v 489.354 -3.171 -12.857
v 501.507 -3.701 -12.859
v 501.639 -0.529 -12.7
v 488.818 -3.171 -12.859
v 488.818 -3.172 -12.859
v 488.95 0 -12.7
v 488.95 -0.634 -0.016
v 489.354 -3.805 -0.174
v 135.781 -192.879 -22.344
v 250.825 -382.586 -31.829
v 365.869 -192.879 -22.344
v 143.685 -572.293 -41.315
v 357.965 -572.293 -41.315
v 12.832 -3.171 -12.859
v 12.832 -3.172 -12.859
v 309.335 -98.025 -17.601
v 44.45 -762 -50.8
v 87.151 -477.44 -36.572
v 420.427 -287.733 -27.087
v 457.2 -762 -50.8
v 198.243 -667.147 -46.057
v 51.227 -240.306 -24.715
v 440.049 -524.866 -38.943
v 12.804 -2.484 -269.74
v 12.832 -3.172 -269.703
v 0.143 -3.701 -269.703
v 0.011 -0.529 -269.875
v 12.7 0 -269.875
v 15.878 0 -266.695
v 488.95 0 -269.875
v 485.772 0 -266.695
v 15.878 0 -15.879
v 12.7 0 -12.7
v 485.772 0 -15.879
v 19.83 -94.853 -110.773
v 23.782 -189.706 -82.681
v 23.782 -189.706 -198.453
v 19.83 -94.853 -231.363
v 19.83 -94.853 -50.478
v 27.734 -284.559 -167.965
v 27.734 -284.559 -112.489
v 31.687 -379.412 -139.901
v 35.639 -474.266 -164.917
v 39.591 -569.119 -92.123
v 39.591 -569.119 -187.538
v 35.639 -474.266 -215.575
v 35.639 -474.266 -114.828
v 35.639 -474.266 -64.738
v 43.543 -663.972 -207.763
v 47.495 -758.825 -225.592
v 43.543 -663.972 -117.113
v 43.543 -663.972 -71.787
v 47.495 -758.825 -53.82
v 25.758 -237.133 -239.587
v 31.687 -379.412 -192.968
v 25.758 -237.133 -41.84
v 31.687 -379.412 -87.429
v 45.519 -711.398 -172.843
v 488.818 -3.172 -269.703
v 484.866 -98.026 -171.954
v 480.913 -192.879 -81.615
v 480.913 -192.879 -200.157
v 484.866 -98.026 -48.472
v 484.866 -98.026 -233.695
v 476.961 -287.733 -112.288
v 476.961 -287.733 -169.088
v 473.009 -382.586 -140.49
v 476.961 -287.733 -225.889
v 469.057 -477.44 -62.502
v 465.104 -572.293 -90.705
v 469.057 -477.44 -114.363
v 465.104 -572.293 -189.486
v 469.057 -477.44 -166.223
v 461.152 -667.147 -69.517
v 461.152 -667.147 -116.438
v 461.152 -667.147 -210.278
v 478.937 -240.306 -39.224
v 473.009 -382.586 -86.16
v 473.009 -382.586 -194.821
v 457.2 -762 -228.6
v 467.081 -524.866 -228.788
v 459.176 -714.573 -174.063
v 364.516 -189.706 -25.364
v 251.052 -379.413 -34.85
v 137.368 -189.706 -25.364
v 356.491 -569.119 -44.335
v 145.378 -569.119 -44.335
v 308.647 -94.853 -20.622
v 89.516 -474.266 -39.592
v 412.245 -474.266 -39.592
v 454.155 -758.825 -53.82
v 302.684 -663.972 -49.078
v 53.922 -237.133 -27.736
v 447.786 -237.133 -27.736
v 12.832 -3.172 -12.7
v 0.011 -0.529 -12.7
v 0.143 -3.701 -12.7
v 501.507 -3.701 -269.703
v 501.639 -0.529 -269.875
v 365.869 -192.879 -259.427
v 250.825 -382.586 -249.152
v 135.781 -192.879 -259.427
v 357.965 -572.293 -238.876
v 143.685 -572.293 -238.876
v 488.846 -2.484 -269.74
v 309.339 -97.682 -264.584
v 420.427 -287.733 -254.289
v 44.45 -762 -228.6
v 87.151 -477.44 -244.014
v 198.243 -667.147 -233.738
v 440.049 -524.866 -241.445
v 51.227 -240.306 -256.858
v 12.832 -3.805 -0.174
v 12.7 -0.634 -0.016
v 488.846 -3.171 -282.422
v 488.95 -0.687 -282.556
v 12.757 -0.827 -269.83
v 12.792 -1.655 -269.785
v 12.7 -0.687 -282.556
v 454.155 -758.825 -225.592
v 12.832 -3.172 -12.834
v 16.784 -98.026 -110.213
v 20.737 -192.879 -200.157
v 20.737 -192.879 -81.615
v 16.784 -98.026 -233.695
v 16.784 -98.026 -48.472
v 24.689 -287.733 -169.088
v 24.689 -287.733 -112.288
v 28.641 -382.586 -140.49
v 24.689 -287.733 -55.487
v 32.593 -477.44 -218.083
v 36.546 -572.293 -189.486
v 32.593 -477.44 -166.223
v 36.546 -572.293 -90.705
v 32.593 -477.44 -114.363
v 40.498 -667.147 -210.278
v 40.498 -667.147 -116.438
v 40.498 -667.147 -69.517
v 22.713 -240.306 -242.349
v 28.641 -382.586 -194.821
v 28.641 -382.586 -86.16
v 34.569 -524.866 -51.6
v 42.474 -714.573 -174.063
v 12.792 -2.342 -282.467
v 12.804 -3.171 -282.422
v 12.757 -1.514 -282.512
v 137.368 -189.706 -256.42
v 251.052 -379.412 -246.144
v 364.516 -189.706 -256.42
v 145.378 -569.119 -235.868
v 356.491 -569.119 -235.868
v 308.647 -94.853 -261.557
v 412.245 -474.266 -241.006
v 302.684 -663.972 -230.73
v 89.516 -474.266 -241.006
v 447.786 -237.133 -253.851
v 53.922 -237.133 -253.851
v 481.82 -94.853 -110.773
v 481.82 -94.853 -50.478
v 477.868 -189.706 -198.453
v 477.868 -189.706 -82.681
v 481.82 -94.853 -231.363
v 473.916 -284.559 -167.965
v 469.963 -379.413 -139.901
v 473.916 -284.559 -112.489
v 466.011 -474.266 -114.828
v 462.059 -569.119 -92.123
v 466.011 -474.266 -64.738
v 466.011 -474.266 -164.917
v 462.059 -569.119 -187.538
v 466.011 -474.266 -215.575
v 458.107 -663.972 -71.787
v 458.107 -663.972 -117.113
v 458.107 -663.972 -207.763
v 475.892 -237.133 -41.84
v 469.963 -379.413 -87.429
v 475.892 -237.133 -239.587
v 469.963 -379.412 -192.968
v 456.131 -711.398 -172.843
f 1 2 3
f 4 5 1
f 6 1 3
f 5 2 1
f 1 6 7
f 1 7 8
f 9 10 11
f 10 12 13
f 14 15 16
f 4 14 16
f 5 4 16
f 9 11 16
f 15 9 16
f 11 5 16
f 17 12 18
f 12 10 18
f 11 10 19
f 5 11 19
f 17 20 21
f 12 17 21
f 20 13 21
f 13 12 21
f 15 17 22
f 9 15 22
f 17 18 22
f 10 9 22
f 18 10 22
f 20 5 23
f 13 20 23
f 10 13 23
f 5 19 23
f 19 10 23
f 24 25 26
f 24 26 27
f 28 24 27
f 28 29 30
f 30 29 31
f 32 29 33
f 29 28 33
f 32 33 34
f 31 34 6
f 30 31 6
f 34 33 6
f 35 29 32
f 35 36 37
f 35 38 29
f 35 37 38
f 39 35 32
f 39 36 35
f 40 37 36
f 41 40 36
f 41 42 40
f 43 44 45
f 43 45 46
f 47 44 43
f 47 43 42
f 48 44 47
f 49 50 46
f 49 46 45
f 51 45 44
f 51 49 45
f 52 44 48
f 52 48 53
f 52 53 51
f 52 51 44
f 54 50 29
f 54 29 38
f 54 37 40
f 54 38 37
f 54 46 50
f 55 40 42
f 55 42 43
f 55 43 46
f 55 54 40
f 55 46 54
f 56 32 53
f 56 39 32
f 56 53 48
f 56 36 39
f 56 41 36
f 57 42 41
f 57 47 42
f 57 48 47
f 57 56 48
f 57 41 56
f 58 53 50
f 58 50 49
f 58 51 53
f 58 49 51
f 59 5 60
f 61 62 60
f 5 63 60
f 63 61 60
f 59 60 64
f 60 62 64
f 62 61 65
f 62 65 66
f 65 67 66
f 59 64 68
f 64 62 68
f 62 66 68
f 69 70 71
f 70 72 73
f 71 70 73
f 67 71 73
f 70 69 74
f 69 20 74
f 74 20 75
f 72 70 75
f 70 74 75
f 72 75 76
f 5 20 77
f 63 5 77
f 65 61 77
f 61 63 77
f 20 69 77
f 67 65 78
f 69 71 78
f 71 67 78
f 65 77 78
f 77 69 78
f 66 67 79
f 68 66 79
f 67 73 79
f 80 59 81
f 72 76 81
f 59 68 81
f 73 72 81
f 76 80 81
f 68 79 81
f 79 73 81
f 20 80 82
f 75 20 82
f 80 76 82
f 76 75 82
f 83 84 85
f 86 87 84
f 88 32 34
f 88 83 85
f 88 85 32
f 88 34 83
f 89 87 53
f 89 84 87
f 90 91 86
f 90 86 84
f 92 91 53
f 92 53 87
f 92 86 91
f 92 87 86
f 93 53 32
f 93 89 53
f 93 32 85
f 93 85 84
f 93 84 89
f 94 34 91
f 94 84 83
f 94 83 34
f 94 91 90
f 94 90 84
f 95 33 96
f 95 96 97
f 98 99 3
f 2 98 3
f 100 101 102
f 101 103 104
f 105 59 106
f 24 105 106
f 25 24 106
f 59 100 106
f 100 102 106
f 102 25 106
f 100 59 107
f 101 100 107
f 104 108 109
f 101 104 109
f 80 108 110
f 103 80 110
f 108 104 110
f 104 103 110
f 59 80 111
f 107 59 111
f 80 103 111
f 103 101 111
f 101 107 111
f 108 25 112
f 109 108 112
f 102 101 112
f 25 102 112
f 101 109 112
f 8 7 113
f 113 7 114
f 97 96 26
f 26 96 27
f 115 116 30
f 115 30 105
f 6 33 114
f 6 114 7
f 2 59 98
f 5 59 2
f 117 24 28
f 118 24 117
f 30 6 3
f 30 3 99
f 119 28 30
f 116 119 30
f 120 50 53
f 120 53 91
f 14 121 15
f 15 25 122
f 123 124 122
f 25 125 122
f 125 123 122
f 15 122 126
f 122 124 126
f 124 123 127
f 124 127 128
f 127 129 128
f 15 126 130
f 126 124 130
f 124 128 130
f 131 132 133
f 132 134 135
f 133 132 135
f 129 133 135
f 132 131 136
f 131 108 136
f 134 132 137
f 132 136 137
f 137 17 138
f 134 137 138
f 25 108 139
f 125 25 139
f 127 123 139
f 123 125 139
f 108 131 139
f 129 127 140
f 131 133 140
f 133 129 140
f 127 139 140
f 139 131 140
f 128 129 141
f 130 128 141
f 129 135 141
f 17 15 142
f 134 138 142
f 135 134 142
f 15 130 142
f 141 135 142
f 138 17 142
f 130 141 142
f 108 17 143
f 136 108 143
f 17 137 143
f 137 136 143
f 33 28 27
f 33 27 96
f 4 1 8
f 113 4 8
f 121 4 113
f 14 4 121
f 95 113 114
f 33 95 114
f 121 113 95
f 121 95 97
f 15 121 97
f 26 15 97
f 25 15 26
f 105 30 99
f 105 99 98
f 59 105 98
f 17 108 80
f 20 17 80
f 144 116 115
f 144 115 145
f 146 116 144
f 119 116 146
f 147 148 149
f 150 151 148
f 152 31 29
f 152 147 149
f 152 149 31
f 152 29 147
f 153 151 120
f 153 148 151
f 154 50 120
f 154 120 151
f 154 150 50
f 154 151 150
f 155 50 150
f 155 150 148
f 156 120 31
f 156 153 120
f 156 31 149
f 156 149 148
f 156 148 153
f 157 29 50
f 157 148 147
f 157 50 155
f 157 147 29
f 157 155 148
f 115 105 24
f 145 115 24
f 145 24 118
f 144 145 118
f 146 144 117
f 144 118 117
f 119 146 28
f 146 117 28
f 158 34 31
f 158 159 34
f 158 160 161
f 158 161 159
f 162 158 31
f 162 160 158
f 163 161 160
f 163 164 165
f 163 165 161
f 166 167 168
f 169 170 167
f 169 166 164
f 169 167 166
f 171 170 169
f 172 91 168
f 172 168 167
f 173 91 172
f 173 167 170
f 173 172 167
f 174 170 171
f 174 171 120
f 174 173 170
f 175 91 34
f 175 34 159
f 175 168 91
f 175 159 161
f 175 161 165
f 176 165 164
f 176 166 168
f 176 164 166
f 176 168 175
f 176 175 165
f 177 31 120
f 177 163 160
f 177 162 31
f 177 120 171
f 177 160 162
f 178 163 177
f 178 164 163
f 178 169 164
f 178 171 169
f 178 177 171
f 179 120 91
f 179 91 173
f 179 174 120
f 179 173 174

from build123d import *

# Parameters (mm, degrees)
SHELL2_T            = -3.175
BOSS_EXTRUDE3_DEPTH = 12.7
BOSS_EXTRUDE4_DEPTH = 12.7
BOSS_EXTRUDE5_DEPTH = 12.7
BOSS_EXTRUDE6_DEPTH = 12.7


with BuildPart() as part:
    # Sketch1 → Loft1 section 0
    with BuildSketch(Plane(origin=(0, 0, 0), x_dir=(1, 0, 0), z_dir=(0, 1, 0))):
        with BuildLine():
            Line((12.7, 269.875), (12.7, 12.7))
            Line((12.7, 12.7), (488.95, 12.7))
            Line((488.95, 12.7), (488.95, 269.875))
            Line((488.95, 269.875), (12.7, 269.875))
        make_face()
    # Sketch6 → Loft1 section 1
    with BuildSketch(Plane(origin=(0, -762, 0), x_dir=(1, 0, 0), z_dir=(0, 1, 0))):
        with BuildLine():
            Line((44.45, 50.8), (457.2, 50.8))
            Line((457.2, 50.8), (457.2, 228.6))
            Line((457.2, 228.6), (44.45, 228.6))
            Line((44.45, 228.6), (44.45, 50.8))
        make_face()
    loft()

    # Shell2
    shell2_openings = [part.faces().sort_by_distance(p)[0] for p in [
        (250.825, 0, -141.2875),
    ]]
    offset(amount=SHELL2_T, openings=shell2_openings, kind=Kind.INTERSECTION)

    # Sketch7 → Boss-Extrude3 (add)
    with BuildSketch(Plane(origin=(12.677989601, 0.528249567, 0), x_dir=(0, 0, 1), z_dir=(-0.9991330730923519, -0.04163054471218133, 0))):
        Polygon((-269.875, -0.528707918), (-12.7, -0.528707918), (-12.7, -3.703707918), (-269.703169927, -3.703707918), align=None)
    extrude(amount=BOSS_EXTRUDE3_DEPTH)

    # Sketch8 → Boss-Extrude4 (add)
    with BuildSketch(Plane(origin=(0, -14.575464349, -269.085495681), x_dir=(-1, 0, 0), z_dir=(0, -0.05408737784845071, -0.998536206432936))):
        with BuildLine():
            Line((-12.7, 14.596831097), (-488.95, 14.596831097))
            Line((-488.95, 14.596831097), (-488.846481323, 12.108740796))
            Line((-488.846481323, 12.108740796), (-12.803518677, 12.108740796))
            ThreePointArc((-12.803518677, 12.108740796), (-12.777627818, 13.353862222), (-12.7, 14.596831097))
        make_face()
    extrude(amount=BOSS_EXTRUDE4_DEPTH)

    # Sketch9 → Boss-Extrude5 (add)
    with BuildSketch(Plane(origin=(488.102599653, -20.337608319, 0), x_dir=(0, 0, -1), z_dir=(0.9991330730923519, -0.041630544712181326, 0))):
        Polygon((12.7, 20.355254837), (269.875, 20.355254837), (269.703169927, 17.180254837), (12.858612375, 17.180254837), align=None)
    extrude(amount=BOSS_EXTRUDE5_DEPTH)

    # Sketch10 → Boss-Extrude6 (add)
    with BuildSketch(Plane(origin=(0, 0.633416459, -12.668329177), x_dir=(1, 0, 0), z_dir=(0, -0.049937616943892316, 0.9987523388778448))):
        Polygon((12.7, -0.634207735), (488.95, -0.634207735), (489.354419625, -3.809207735), (12.832126611, -3.809207735), align=None)
    extrude(amount=BOSS_EXTRUDE6_DEPTH)


solid = part.part
